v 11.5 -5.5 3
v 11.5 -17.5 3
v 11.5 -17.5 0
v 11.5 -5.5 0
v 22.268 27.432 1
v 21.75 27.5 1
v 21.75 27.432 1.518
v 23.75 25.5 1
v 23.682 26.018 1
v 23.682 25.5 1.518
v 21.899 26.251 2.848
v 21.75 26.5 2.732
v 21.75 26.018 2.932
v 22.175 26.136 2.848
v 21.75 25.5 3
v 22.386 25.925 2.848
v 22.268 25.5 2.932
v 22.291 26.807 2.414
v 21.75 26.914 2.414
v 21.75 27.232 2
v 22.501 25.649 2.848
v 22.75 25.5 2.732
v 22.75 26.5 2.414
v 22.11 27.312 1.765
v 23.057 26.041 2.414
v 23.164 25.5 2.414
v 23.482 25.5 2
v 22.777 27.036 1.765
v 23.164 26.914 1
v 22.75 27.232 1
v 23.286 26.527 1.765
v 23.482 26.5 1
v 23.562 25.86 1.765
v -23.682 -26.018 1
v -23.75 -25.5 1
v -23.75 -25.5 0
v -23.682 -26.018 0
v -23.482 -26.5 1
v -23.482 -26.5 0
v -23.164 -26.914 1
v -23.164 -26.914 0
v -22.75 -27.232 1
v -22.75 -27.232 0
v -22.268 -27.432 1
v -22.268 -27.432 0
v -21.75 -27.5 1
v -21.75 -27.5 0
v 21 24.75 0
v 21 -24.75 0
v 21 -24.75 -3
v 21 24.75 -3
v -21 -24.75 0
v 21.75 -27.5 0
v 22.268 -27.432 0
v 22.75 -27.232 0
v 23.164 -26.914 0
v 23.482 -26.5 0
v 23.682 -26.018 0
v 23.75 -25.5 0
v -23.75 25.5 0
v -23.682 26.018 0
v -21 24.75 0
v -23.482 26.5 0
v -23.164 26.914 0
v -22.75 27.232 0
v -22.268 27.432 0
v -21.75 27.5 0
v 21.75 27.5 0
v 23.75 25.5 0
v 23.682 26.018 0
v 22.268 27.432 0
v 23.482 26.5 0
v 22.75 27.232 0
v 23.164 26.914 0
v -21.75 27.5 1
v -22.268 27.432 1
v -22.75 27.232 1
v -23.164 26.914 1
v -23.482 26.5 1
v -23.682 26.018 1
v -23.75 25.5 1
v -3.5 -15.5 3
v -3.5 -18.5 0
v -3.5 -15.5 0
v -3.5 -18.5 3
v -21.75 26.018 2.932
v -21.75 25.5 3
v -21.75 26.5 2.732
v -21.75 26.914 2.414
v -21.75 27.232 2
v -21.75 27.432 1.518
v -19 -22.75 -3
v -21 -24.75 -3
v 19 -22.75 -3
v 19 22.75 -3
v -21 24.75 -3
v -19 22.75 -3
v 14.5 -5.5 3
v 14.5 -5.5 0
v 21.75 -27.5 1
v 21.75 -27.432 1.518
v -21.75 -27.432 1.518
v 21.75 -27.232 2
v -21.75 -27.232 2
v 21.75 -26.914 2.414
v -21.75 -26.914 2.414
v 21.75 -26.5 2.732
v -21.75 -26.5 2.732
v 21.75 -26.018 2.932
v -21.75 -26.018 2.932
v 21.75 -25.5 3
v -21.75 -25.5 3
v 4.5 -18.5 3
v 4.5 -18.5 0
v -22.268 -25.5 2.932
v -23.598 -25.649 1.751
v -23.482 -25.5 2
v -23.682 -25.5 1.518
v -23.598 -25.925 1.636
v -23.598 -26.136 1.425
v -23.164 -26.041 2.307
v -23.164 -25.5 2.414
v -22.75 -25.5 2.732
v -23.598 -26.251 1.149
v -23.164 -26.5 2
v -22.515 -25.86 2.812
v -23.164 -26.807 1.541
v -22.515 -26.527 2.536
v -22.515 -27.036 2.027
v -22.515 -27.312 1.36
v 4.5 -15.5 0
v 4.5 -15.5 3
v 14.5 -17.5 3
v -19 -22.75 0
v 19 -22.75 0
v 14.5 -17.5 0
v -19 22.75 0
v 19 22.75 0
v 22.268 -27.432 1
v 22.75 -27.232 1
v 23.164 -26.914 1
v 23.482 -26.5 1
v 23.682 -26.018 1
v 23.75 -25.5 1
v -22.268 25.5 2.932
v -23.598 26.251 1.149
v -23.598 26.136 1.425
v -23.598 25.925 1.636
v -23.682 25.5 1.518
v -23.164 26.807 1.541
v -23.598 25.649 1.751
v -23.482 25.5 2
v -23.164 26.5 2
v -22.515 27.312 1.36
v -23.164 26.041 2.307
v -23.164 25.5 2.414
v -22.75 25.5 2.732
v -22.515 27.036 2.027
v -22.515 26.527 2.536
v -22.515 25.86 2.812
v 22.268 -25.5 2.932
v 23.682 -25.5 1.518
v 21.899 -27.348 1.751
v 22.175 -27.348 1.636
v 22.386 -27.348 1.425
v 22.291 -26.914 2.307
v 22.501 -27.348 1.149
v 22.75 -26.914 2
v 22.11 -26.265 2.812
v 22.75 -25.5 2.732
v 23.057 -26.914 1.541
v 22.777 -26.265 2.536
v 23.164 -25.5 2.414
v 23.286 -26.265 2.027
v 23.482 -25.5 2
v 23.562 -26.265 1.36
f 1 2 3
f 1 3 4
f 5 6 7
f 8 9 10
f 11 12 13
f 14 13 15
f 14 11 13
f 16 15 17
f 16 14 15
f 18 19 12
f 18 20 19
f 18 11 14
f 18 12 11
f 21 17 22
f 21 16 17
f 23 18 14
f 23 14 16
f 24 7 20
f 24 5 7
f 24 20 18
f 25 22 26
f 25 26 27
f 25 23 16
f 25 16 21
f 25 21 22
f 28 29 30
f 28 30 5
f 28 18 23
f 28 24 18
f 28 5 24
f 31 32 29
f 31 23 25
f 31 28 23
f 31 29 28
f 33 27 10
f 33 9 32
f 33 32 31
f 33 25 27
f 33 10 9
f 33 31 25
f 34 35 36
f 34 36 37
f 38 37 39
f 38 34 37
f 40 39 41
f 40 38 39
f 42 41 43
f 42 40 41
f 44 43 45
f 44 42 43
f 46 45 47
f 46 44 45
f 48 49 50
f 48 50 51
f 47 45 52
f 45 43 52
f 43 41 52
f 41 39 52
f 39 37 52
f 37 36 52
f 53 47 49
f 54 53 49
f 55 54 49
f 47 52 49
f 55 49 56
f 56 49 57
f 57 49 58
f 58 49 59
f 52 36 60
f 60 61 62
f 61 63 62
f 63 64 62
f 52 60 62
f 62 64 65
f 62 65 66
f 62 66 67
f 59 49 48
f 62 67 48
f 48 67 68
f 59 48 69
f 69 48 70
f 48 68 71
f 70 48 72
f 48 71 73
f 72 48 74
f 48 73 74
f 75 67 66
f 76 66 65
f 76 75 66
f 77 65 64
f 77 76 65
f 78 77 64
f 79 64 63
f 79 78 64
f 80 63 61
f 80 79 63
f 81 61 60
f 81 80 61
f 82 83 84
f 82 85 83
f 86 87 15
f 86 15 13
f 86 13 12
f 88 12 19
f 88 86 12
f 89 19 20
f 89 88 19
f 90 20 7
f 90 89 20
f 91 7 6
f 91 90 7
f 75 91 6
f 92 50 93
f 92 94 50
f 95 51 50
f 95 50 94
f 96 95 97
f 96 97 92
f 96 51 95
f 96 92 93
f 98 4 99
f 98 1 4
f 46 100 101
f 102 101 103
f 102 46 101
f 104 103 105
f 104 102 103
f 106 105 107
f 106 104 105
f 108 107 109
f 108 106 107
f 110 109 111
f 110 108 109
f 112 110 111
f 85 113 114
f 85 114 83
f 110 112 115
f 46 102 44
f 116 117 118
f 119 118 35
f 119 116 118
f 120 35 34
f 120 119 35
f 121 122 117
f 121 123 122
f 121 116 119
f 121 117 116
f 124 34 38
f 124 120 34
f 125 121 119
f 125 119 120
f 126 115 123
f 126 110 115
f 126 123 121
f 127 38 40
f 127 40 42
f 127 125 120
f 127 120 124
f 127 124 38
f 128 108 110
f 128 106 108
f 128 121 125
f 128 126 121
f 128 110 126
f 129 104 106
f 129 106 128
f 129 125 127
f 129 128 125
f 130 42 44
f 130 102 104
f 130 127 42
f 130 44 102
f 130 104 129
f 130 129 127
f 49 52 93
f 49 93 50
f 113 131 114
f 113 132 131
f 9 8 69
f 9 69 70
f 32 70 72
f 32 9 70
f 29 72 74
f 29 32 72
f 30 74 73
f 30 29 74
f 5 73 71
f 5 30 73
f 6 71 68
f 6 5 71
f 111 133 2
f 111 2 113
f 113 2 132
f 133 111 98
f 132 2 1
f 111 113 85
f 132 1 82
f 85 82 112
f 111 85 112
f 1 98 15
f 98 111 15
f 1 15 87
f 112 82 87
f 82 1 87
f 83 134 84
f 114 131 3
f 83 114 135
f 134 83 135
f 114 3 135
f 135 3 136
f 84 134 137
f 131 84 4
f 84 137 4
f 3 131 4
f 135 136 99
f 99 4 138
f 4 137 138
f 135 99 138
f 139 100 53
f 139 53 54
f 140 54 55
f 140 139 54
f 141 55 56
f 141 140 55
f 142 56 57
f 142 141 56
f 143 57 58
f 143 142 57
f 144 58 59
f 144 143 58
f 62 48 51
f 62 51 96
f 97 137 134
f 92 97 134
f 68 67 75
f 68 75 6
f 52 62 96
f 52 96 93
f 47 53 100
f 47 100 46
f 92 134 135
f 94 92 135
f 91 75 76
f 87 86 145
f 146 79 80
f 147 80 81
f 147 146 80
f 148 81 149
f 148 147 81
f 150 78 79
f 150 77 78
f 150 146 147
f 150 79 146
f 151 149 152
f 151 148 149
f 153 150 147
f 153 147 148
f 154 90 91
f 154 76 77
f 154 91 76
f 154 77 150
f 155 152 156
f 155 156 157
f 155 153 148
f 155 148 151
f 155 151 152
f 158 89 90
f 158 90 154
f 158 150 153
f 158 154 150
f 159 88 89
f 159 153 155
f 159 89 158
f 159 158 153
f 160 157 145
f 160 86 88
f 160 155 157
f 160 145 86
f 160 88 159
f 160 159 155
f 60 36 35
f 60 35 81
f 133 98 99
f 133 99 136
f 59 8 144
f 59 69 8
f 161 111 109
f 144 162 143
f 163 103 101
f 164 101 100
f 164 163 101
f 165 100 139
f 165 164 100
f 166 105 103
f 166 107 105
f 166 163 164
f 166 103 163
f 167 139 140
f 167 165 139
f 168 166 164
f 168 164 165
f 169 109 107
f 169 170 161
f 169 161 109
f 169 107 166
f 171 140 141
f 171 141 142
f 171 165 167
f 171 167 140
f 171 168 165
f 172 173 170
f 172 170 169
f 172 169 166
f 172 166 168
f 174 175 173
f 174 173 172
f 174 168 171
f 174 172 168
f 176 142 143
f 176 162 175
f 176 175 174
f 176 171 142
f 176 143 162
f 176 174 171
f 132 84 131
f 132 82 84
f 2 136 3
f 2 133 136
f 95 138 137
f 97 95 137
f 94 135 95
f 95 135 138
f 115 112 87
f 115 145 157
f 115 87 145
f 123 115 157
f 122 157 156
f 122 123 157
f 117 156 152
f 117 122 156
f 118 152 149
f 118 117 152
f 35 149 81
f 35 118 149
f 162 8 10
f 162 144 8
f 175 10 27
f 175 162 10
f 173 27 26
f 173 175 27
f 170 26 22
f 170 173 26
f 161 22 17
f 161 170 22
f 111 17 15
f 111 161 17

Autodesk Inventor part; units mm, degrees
ref_plane "YZ Plane" through (0, 0, 0) normal (1, 0, 0) x (0, 1, 0)
ref_plane "XZ Plane" through (0, 0, 0) normal (0, 1, 0) x (-1, 0, 0)
sketch "Náčrt1" plane through (0, 0, 0) normal (0, 0, 1) x (1, 0, 0)
  line L0 (0, 35) -> (0, -35) projected
  line L1 (-29.75, 0) -> (29.75, 0) projected
  line L2 (21.25, -25) -> (-21.25, -25)
  line L3 (-21.25, -25) -> (-21.25, 25)
  line L4 (-21.25, 25) -> (21.25, 25)
  line L5 (21.25, 25) -> (21.25, -25)
  point P0 (0, 0)
  dimension "d0" = 42.5
  dimension "d1" = 50
extrude "Vysunutí1" add sketch "Náčrt1" along normal blind 3
sketch "Náčrt2" plane through (0, 0, 3) normal (0, 0, 1) x (1, 0, 0)
  line L0 (21.25, 25) -> (-21.25, 25) projected
  line L1 (-21.25, 25) -> (-21.25, -25) projected
  line L2 (-21.25, -25) -> (21.25, -25) projected
  line L3 (21.25, -25) -> (21.25, 25) projected
  line L4 (0, 35) -> (0, -35) projected
  line L5 (-29.75, 0) -> (29.75, 0) projected
  line L6 (4.5, -18.5) -> (-3.5, -18.5)
  line L7 (-3.5, -18.5) -> (-3.5, -15.5)
  line L8 (-3.5, -15.5) -> (4.5, -15.5)
  line L9 (4.5, -15.5) -> (4.5, -18.5)
  line L10 (14.5, -17.5) -> (11.5, -17.5)
  line L11 (11.5, -17.5) -> (11.5, -5.5)
  line L12 (11.5, -5.5) -> (14.5, -5.5)
  line L13 (14.5, -5.5) -> (14.5, -17.5)
  line L14 (-17.5, 21.5) -> (17.5, 21.5) construction
  line L15 (17.5, 21.5) -> (17.5, -21.5) construction
  line L16 (17.5, -21.5) -> (-17.5, -21.5) construction
  line L17 (-17.5, -21.5) -> (-17.5, 21.5) construction
  point P0 (0, 0)
  dimension "d4" = 12
  dimension "d5" = 3
  dimension "d6" = 8
  dimension "d7" = 3
  dimension "d9" = 35
  dimension "d10" = 43
  dimension "d11" = 3
  dimension "d13" = 3
  dimension "d29" = 16
  dimension "d30" = 21
extrude "Vysunutí2" cut sketch "Náčrt2" against normal through all contours L8 L9 L6 L4 | L4 L6 L7 L8 | L10 L11 L12 L13
sketch "Náčrt3" plane through (0, 0, 3) normal (0, 0, 1) x (1, 0, 0)
  line L0 (-3.5, -18.5) -> (-3.5, -15.5) projected
  line L1 (-3.5, -15.5) -> (4.5, -15.5) projected
  line L2 (4.5, -15.5) -> (4.5, -18.5) projected
  line L3 (4.5, -18.5) -> (-3.5, -18.5) projected
  line L4 (11.5, -17.5) -> (11.5, -5.5) projected
  line L5 (11.5, -5.5) -> (14.5, -5.5) projected
  line L6 (14.5, -5.5) -> (14.5, -17.5) projected
  line L7 (14.5, -17.5) -> (11.5, -17.5) projected
  line L8 (21.25, 25) -> (-21.25, 25) projected
  line L9 (-21.25, 25) -> (-21.25, -25) projected
  line L10 (-21.25, -25) -> (21.25, -25) projected
  line L11 (21.25, -25) -> (21.25, 25) projected
  line L12 (0, 38.5) -> (0, -38.5) projected
  line L13 (-33.25, 0) -> (33.25, 0) projected
  line L14 (-19, 22.75) -> (19, 22.75)
  line L15 (19, 22.75) -> (19, -22.75)
  line L16 (19, -22.75) -> (-19, -22.75)
  line L17 (-19, -22.75) -> (-19, 22.75)
  line L18 (-21, 24.75) -> (21, 24.75)
  line L19 (21, 24.75) -> (21, -24.75)
  line L20 (21, -24.75) -> (-21, -24.75)
  line L21 (-21, -24.75) -> (-21, 24.75)
  point P0 (0, 0)
  dimension "d31" = 0.25
  dimension "d32" = 2
extrude "Vysunutí3" add sketch "Náčrt3" along normal blind 3 contours L16 L15 L13 L19 L20 L12 | L12 L20 L21 L13 L17 L16 | L14 L17 L13 L21 L18 L12 | L12 L18 L19 L13 L15 L14
sketch "Náčrt6" plane through (0, 0, 0) normal (0, 0, -1) x (-1, 0, 0)
  line L0 (3.5, -15.5) -> (3.5, -18.5) projected
  line L1 (3.5, -18.5) -> (-4.5, -18.5) projected
  line L2 (-4.5, -18.5) -> (-4.5, -15.5) projected
  line L3 (-4.5, -15.5) -> (3.5, -15.5) projected
  line L4 (-11.5, -5.5) -> (-11.5, -17.5) projected
  line L5 (-11.5, -17.5) -> (-14.5, -17.5) projected
  line L6 (-14.5, -17.5) -> (-14.5, -5.5) projected
  line L7 (-14.5, -5.5) -> (-11.5, -5.5) projected
  line L8 (-21.25, 25) -> (21.25, 25) projected
  line L9 (-21.25, -25) -> (-21.25, 25) projected
  line L10 (21.25, -25) -> (-21.25, -25) projected
  line L11 (21.25, 25) -> (21.25, -25) projected
  line L12 (0, -35) -> (0, 35) projected
  line L13 (-29.75, 0) -> (29.75, 0) projected
  line L14 (23.75, 27.5) -> (-23.75, 27.5)
  line L15 (-23.75, 27.5) -> (-23.75, -27.5)
  line L16 (-23.75, -27.5) -> (23.75, -27.5)
  line L17 (23.75, -27.5) -> (23.75, 27.5)
  point P0 (0, 0)
  dimension "d33" = 2.5
extrude "Vysunutí6" add sketch "Náčrt6" against normal up to surface (3 mm away) contours L12 L16 L15 L13 L9 L10 | L10 L11 L13 L17 L16 L12 | L12 L14 L17 L13 L11 L8 | L8 L9 L13 L15 L14 L12
ref_plane "Pracovní rovina1" through (0, 0, 1.5) normal (0, 0, -1) x (-1, 0, 0)
mirror "Zrcadlit1" about plane through (0, 0, 1.5) normal (0, 0, -1) of "Vysunutí3"
ref_plane "Pracovní rovina2" through (0, 0, 3) normal (0, 0, 1) x (1, 0, 0)
split "Rozdělit1" plane through (0, 0, 3) removes the side toward (0, 0, 1)
fillet "Zaoblení4" radius 2 8 edges at (23.75, 27.5, 1.5) (23.75, 0, 3) (0, 27.5, 3) (23.75, -27.5, 1.5) (0, -27.5, 3) (-23.75, 27.5, 1.5) (-23.75, 0, 3) (-23.75, -27.5, 1.5)
properties part number "a4988_box_lid_3D tisk"
